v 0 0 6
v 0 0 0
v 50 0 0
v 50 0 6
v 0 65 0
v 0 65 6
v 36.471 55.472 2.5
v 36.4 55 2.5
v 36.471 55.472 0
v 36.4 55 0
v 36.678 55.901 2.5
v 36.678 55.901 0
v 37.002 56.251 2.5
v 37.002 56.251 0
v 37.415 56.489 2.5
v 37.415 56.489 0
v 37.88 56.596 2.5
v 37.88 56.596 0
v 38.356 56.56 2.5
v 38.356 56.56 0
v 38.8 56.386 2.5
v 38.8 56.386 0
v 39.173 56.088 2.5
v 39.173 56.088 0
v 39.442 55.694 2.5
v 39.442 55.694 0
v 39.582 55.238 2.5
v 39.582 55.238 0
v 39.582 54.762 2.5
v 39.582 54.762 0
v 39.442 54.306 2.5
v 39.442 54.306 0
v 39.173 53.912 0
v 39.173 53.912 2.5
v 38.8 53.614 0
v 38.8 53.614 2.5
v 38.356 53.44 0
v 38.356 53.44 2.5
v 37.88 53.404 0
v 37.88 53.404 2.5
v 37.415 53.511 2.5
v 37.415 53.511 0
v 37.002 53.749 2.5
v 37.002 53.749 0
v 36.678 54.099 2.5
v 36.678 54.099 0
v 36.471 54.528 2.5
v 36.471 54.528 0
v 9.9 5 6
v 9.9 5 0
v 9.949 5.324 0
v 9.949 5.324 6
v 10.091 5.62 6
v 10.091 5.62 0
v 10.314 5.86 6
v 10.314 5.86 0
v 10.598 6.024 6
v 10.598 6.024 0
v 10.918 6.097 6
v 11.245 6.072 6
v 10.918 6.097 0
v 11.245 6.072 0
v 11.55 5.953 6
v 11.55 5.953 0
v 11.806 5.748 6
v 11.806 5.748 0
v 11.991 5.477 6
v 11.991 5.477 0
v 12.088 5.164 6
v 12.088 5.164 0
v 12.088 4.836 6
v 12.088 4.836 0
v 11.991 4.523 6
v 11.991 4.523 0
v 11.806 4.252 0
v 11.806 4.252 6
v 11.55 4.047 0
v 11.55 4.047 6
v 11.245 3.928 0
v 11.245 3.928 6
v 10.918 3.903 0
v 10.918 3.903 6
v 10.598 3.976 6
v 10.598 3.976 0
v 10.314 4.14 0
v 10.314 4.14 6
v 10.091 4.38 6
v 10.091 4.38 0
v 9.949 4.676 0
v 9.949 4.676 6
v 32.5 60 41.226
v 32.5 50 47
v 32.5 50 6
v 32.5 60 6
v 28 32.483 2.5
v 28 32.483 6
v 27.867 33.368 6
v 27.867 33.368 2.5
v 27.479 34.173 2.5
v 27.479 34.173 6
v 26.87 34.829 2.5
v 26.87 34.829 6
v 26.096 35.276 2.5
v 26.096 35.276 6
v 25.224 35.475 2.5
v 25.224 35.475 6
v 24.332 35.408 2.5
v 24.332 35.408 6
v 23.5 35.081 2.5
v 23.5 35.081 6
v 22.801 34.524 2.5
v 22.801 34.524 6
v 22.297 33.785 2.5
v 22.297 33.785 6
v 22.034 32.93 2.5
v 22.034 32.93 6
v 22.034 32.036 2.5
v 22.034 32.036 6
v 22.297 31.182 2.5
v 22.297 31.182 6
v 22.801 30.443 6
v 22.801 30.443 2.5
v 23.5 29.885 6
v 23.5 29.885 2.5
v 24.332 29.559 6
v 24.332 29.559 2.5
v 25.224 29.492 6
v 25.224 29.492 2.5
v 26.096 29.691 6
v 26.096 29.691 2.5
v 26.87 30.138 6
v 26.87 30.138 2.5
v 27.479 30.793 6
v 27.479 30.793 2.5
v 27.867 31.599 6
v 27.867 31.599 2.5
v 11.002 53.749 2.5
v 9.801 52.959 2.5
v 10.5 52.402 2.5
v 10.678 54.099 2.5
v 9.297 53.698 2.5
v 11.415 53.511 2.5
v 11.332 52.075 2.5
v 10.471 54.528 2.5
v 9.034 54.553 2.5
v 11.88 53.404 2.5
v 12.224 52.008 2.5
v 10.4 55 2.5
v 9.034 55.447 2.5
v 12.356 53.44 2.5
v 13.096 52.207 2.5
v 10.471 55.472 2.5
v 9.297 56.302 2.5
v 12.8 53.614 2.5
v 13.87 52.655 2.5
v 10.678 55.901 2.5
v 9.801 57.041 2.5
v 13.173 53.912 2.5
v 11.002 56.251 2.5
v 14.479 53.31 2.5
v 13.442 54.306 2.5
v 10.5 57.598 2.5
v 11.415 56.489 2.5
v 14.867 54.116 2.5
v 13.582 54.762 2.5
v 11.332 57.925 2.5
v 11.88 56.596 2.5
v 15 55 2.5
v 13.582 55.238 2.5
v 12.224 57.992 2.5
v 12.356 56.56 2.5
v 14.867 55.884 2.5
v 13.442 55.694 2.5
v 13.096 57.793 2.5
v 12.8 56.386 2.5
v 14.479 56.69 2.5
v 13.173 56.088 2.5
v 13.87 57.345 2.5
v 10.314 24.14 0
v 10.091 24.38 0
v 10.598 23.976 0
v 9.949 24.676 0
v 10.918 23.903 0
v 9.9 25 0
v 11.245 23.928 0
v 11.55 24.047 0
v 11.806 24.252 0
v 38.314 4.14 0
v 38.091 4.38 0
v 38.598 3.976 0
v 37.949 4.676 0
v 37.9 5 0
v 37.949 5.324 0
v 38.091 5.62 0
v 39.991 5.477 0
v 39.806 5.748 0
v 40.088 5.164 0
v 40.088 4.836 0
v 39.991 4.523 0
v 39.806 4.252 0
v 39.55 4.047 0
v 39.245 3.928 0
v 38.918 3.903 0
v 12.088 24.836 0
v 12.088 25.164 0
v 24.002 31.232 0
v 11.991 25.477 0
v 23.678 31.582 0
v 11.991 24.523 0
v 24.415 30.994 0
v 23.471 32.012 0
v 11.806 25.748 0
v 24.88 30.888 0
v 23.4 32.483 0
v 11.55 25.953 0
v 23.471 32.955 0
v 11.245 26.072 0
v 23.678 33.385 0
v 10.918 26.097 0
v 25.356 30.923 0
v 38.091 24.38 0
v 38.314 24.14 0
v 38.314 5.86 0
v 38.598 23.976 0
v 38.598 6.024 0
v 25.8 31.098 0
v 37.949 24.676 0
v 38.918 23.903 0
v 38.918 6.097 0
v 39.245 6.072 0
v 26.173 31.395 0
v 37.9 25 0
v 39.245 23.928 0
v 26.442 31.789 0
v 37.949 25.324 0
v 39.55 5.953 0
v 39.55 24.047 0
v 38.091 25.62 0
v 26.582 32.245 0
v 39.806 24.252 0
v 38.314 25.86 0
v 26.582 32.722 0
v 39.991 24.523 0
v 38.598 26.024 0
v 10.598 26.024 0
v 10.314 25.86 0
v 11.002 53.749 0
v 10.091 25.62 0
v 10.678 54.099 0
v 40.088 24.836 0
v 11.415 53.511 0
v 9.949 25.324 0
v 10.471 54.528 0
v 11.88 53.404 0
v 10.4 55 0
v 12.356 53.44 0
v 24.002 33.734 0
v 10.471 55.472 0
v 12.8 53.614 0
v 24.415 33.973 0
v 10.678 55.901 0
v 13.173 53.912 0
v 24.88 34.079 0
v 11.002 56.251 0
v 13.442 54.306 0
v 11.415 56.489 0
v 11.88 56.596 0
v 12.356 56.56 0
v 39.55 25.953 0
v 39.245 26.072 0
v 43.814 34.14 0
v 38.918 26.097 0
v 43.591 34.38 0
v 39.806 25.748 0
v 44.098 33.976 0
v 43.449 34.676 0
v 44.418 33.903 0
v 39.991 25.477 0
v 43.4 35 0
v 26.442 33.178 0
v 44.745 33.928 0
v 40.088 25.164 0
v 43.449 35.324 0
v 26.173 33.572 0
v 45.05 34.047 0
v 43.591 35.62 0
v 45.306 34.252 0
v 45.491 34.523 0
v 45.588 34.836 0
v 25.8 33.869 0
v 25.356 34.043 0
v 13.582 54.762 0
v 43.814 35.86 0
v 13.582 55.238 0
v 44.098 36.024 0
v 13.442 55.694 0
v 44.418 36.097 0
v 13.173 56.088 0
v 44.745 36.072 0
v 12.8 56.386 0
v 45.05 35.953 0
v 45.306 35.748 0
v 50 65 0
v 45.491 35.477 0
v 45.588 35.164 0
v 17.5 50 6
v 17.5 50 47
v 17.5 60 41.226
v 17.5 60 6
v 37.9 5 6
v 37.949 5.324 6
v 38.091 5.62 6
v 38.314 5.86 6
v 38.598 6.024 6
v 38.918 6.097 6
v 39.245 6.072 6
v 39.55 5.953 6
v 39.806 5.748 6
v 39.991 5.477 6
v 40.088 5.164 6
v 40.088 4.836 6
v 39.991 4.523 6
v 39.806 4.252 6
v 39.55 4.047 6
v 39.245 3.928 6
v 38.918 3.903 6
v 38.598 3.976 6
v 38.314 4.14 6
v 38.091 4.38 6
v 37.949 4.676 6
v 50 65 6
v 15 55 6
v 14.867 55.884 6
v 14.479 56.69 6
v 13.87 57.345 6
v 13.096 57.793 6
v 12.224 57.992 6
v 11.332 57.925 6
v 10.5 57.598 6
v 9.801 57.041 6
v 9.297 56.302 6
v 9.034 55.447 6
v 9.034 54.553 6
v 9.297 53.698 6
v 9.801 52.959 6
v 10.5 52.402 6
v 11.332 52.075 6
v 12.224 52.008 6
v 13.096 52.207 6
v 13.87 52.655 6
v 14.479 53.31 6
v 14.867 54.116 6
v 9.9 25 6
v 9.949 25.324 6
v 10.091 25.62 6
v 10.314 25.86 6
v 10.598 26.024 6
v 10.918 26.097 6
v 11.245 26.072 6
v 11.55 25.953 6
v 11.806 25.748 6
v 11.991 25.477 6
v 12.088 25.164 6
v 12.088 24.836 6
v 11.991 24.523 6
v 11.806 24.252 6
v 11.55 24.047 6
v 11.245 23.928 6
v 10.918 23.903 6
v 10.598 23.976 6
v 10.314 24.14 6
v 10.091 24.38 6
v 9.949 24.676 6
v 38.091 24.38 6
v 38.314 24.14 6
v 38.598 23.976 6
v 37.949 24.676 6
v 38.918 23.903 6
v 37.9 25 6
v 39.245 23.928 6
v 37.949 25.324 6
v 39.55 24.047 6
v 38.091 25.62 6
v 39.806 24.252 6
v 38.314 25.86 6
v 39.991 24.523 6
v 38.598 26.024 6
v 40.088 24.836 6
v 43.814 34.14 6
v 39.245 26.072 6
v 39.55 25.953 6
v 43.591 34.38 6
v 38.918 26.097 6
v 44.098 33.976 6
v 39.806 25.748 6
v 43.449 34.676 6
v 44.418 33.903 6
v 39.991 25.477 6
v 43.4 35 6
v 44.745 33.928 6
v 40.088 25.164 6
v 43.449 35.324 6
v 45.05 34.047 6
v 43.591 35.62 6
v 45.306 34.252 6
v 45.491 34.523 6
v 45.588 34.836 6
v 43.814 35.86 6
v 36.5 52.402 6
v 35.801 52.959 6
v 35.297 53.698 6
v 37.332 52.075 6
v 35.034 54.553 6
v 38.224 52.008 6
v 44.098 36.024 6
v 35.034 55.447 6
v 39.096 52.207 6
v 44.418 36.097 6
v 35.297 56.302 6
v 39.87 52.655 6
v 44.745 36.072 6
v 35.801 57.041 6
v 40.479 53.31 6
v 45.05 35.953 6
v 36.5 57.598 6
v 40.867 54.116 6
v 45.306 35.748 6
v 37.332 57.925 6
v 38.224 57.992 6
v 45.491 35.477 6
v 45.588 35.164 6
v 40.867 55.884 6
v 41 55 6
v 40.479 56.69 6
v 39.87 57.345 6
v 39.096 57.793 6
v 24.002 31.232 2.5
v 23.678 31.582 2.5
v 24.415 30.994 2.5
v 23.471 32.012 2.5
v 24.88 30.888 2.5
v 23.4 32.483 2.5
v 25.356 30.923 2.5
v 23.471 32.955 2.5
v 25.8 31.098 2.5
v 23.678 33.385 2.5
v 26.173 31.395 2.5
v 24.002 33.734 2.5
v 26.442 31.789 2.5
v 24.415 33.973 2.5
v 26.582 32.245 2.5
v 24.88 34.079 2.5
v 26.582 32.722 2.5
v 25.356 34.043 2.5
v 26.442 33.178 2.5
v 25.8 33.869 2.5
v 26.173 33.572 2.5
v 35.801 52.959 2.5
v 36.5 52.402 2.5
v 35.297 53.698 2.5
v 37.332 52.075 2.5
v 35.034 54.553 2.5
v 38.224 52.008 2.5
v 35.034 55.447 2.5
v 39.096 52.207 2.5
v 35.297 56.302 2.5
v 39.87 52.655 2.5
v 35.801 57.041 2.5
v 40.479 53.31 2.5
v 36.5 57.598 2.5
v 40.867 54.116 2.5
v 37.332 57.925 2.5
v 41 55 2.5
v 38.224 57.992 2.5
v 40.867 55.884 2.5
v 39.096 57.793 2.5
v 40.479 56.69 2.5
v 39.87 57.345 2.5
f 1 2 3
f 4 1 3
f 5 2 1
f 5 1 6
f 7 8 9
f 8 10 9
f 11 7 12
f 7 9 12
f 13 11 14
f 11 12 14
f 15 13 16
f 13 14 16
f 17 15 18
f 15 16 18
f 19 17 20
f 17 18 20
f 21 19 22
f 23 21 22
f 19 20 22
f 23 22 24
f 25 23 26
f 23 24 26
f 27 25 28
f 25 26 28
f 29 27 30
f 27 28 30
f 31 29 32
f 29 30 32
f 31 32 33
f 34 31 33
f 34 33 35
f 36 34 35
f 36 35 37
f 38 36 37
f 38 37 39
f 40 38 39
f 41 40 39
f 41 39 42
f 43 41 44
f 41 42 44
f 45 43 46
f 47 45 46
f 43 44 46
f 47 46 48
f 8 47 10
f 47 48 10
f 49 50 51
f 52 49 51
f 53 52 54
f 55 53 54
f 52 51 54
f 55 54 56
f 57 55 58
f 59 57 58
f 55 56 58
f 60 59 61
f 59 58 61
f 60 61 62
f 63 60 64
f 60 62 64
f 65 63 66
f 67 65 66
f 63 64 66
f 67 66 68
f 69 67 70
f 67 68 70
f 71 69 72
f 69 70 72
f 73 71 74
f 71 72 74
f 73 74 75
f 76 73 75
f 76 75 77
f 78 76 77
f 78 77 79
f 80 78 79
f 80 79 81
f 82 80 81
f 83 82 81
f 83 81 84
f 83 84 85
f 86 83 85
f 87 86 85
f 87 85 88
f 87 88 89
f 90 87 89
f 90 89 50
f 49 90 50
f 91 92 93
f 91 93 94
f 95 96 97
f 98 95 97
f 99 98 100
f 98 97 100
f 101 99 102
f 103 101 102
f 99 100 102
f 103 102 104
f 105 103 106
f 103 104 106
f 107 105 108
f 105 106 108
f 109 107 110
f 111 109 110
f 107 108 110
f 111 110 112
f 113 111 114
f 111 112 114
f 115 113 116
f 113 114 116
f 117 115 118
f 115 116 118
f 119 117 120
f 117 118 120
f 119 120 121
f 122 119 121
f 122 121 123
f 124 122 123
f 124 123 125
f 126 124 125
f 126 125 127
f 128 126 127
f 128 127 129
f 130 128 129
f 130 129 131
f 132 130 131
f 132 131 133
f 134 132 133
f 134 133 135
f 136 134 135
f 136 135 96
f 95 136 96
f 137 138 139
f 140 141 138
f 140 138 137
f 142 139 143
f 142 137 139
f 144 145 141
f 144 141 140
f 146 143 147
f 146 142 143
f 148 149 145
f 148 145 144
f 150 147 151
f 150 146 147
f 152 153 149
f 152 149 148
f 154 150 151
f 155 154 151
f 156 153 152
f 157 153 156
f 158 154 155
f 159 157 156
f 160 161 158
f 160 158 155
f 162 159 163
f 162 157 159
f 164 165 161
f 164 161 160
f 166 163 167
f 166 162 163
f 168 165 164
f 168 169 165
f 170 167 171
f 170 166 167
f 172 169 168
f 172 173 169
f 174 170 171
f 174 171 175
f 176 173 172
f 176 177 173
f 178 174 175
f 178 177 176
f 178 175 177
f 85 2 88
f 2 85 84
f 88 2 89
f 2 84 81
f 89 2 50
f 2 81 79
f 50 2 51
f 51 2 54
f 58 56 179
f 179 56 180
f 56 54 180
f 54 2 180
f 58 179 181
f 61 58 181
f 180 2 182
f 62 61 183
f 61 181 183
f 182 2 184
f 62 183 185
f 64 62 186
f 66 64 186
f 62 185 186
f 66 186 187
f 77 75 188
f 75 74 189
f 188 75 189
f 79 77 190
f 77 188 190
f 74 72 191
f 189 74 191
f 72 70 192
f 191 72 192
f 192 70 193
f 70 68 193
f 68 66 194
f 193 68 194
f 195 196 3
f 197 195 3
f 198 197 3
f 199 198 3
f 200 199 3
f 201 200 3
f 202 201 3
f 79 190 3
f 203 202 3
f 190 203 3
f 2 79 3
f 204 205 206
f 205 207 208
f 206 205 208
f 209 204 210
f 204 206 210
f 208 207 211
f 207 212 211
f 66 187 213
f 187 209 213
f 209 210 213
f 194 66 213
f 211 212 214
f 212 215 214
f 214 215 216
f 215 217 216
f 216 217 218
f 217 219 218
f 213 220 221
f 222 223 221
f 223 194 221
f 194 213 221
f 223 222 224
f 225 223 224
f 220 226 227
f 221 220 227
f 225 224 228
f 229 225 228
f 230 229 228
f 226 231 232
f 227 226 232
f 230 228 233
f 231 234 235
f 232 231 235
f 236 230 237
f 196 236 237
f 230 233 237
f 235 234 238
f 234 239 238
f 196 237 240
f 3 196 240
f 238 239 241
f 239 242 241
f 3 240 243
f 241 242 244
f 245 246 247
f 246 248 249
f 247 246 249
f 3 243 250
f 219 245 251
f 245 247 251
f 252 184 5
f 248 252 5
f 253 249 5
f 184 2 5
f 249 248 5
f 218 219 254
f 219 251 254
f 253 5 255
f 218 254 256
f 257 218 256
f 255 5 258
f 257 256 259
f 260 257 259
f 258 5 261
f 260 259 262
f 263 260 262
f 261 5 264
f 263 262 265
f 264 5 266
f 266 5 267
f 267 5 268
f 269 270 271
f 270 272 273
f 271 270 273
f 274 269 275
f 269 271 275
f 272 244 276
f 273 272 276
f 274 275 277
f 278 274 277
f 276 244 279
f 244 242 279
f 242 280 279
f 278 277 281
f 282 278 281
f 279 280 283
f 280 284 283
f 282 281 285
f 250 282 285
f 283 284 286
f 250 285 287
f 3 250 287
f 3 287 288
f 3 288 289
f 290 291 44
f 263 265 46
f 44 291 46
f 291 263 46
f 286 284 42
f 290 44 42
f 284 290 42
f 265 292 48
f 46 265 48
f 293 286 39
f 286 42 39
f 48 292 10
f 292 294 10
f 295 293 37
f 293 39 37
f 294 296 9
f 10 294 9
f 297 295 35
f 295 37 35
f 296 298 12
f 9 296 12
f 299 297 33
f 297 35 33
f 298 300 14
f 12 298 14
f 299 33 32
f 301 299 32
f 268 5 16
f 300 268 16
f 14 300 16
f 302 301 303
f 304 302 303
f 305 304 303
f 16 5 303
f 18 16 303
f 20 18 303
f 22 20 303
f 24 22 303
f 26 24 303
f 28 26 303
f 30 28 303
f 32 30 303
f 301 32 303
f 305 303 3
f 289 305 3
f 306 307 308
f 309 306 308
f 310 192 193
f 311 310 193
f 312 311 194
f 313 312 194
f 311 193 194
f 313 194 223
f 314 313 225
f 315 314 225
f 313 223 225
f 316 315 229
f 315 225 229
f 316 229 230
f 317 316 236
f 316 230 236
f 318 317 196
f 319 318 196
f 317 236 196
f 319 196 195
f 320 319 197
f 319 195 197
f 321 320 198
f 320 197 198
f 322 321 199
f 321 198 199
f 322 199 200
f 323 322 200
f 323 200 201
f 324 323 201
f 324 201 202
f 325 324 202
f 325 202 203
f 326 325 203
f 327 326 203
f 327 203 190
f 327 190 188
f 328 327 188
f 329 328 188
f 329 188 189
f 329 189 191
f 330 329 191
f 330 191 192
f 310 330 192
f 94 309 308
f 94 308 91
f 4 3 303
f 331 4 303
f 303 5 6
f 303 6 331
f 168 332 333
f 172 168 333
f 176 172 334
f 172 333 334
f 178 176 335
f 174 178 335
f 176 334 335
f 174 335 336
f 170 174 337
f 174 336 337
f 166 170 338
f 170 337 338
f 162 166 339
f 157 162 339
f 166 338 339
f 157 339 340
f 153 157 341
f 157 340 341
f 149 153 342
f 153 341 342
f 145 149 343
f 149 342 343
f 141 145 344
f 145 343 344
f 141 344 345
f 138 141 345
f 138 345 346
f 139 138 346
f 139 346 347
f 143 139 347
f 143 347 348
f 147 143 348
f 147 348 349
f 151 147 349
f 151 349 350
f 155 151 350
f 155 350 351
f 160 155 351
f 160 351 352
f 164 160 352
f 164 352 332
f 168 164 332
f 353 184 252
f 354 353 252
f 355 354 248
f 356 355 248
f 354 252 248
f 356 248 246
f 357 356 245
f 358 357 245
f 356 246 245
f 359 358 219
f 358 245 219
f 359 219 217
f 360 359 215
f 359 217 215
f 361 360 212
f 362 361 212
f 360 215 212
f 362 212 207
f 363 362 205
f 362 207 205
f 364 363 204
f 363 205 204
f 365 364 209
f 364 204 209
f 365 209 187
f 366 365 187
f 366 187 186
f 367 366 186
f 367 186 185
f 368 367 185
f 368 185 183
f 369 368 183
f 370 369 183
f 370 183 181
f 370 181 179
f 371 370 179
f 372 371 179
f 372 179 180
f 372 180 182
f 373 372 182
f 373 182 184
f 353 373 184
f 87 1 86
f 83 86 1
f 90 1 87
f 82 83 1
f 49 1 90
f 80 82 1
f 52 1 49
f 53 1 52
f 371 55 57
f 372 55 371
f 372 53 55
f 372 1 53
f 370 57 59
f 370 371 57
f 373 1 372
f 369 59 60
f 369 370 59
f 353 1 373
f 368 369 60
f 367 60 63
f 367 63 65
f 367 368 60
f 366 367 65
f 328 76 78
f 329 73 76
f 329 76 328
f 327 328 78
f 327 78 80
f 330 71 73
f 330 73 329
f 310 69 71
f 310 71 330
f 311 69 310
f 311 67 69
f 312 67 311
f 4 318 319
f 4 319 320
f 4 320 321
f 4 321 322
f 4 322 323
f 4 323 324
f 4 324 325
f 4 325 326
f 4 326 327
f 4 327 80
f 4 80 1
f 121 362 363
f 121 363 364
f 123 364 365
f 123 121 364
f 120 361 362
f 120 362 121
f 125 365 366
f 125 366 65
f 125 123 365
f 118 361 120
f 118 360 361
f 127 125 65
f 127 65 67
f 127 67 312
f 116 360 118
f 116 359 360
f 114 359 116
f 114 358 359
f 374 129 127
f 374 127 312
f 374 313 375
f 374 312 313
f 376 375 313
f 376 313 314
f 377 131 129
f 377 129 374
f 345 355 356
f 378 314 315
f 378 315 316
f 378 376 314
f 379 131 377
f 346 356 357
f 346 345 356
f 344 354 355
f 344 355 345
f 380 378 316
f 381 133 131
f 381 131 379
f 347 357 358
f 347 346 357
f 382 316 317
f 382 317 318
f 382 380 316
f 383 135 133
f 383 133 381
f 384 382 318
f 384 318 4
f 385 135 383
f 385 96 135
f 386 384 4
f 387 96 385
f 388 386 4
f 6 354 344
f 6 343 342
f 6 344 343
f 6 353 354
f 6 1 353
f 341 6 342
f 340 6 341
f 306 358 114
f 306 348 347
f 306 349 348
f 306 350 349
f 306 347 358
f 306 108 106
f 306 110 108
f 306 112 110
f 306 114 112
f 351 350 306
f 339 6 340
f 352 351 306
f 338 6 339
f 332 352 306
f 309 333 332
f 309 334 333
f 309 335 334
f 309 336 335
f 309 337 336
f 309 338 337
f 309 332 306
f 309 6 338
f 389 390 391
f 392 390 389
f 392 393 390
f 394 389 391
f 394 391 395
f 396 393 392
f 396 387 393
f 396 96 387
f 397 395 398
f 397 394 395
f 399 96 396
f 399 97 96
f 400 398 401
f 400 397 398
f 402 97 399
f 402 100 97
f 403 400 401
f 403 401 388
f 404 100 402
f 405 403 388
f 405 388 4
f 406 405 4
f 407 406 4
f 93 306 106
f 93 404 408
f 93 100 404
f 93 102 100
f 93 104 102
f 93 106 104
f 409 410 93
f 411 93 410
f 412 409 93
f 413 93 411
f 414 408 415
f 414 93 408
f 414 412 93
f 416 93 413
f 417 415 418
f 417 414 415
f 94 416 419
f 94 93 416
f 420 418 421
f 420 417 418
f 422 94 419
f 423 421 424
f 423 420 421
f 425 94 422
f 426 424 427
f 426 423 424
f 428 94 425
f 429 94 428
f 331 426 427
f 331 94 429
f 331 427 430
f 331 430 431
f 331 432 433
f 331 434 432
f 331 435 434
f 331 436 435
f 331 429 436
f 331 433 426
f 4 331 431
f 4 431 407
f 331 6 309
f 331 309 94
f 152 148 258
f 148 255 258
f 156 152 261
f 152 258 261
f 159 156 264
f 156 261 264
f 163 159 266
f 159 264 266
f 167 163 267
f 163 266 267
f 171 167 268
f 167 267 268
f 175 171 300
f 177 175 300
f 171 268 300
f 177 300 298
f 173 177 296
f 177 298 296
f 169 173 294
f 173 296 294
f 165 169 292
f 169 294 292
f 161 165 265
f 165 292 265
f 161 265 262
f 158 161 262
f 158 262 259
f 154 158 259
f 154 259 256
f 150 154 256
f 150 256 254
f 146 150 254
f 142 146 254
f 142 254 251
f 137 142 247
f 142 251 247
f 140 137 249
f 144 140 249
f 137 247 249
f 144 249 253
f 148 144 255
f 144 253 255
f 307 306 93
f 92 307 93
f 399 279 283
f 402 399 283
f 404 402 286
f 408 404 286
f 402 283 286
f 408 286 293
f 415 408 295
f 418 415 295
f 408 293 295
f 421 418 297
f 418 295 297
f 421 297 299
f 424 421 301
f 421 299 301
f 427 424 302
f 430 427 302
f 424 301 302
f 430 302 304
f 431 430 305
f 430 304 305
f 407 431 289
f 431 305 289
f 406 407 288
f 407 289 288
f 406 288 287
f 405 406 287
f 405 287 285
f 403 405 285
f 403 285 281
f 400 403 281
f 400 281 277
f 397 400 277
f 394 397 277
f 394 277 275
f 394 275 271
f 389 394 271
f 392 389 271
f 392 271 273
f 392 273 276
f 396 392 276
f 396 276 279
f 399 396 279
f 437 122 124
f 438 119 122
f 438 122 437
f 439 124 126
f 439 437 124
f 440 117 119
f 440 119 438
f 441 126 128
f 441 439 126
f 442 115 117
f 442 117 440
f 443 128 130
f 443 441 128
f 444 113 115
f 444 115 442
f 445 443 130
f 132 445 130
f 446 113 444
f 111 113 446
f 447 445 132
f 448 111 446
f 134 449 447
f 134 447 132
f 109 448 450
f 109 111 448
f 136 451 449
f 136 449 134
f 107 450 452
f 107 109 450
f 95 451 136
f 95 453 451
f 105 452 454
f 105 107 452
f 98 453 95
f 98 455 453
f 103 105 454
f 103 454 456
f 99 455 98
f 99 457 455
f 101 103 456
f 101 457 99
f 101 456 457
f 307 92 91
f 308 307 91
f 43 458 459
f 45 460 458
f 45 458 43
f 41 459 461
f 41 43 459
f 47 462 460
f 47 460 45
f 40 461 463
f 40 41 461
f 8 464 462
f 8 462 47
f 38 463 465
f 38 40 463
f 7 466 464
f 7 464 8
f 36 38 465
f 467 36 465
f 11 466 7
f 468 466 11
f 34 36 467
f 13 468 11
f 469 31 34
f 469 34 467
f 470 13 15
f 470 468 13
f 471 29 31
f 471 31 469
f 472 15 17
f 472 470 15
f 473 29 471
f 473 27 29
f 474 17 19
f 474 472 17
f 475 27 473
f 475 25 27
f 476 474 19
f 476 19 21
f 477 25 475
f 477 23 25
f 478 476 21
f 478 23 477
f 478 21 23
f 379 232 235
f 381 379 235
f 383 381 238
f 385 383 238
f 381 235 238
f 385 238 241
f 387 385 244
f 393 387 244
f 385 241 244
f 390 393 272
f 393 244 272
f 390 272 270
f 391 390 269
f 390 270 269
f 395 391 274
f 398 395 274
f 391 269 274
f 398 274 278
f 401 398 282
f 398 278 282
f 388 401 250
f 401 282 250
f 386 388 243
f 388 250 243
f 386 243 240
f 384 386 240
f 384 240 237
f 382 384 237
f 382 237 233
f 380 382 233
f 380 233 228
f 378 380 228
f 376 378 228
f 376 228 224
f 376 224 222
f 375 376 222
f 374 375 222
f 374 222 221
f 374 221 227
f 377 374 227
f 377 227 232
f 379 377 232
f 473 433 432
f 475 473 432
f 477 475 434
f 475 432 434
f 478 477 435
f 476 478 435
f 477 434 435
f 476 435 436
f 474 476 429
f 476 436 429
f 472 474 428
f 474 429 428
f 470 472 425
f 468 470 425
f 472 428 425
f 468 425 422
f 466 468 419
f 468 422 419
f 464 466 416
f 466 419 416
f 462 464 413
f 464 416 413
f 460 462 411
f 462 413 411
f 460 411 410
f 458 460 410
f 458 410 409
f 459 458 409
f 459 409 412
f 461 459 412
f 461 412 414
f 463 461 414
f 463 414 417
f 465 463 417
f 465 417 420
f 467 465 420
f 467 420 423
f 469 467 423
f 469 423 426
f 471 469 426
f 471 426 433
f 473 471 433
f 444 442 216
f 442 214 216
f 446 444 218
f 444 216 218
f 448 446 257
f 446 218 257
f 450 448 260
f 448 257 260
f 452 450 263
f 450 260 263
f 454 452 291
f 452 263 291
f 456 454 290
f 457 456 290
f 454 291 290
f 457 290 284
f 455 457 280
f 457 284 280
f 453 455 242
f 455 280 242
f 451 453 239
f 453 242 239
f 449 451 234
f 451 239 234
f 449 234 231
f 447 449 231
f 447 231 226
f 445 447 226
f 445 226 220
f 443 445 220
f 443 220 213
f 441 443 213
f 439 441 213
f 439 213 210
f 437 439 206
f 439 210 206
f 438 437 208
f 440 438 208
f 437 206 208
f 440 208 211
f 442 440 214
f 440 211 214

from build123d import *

# Parameters (mm, degrees)
F0_W           = 50
F0_H           = 65
F1_DEPTH       = 6
F2_W           = 15
F2_H           = 10
F3_DEPTH       = 41
F5_D           = 3.2
F5_CBORE_D     = 6
F5_CBORE_DEPTH = 3.5
F7_D           = 2.2
F9_DEPTH       = 15


with BuildPart() as f1:
    # F0 (on Top) → F1 (new body)
    with BuildSketch(Plane.XY):
        with Locations((25, 32.5)):
            Rectangle(F0_W, F0_H)
    extrude(amount=F1_DEPTH)

    # F2 (on face) → F3 (join)
    with BuildSketch(Plane.XY.offset(6)):
        with Locations((25, 55)):
            Rectangle(F2_W, F2_H)
    extrude(amount=F3_DEPTH)

    # F5 (through all)
    with Locations(Plane.XY.offset(6)):
        with Locations((12, 55), (38, 55), (25, 32.48334)):
            CounterBoreHole(F5_D / 2, F5_CBORE_D / 2, F5_CBORE_DEPTH)

    # F7 (through all)
    with Locations(Plane.XY.offset(6)):
        with Locations((11, 25), (39, 25), (39, 5), (11, 5), (44.5, 35)):
            Hole(F7_D / 2)

    # F8 (on face) → F9 (cut, through all)
    with BuildSketch(Plane.YZ.offset(32.5)):
        Polygon((60, 47), (50, 47), (60, 41.226497), align=None)
    extrude(amount=-F9_DEPTH, mode=Mode.SUBTRACT)


solid = f1.part
